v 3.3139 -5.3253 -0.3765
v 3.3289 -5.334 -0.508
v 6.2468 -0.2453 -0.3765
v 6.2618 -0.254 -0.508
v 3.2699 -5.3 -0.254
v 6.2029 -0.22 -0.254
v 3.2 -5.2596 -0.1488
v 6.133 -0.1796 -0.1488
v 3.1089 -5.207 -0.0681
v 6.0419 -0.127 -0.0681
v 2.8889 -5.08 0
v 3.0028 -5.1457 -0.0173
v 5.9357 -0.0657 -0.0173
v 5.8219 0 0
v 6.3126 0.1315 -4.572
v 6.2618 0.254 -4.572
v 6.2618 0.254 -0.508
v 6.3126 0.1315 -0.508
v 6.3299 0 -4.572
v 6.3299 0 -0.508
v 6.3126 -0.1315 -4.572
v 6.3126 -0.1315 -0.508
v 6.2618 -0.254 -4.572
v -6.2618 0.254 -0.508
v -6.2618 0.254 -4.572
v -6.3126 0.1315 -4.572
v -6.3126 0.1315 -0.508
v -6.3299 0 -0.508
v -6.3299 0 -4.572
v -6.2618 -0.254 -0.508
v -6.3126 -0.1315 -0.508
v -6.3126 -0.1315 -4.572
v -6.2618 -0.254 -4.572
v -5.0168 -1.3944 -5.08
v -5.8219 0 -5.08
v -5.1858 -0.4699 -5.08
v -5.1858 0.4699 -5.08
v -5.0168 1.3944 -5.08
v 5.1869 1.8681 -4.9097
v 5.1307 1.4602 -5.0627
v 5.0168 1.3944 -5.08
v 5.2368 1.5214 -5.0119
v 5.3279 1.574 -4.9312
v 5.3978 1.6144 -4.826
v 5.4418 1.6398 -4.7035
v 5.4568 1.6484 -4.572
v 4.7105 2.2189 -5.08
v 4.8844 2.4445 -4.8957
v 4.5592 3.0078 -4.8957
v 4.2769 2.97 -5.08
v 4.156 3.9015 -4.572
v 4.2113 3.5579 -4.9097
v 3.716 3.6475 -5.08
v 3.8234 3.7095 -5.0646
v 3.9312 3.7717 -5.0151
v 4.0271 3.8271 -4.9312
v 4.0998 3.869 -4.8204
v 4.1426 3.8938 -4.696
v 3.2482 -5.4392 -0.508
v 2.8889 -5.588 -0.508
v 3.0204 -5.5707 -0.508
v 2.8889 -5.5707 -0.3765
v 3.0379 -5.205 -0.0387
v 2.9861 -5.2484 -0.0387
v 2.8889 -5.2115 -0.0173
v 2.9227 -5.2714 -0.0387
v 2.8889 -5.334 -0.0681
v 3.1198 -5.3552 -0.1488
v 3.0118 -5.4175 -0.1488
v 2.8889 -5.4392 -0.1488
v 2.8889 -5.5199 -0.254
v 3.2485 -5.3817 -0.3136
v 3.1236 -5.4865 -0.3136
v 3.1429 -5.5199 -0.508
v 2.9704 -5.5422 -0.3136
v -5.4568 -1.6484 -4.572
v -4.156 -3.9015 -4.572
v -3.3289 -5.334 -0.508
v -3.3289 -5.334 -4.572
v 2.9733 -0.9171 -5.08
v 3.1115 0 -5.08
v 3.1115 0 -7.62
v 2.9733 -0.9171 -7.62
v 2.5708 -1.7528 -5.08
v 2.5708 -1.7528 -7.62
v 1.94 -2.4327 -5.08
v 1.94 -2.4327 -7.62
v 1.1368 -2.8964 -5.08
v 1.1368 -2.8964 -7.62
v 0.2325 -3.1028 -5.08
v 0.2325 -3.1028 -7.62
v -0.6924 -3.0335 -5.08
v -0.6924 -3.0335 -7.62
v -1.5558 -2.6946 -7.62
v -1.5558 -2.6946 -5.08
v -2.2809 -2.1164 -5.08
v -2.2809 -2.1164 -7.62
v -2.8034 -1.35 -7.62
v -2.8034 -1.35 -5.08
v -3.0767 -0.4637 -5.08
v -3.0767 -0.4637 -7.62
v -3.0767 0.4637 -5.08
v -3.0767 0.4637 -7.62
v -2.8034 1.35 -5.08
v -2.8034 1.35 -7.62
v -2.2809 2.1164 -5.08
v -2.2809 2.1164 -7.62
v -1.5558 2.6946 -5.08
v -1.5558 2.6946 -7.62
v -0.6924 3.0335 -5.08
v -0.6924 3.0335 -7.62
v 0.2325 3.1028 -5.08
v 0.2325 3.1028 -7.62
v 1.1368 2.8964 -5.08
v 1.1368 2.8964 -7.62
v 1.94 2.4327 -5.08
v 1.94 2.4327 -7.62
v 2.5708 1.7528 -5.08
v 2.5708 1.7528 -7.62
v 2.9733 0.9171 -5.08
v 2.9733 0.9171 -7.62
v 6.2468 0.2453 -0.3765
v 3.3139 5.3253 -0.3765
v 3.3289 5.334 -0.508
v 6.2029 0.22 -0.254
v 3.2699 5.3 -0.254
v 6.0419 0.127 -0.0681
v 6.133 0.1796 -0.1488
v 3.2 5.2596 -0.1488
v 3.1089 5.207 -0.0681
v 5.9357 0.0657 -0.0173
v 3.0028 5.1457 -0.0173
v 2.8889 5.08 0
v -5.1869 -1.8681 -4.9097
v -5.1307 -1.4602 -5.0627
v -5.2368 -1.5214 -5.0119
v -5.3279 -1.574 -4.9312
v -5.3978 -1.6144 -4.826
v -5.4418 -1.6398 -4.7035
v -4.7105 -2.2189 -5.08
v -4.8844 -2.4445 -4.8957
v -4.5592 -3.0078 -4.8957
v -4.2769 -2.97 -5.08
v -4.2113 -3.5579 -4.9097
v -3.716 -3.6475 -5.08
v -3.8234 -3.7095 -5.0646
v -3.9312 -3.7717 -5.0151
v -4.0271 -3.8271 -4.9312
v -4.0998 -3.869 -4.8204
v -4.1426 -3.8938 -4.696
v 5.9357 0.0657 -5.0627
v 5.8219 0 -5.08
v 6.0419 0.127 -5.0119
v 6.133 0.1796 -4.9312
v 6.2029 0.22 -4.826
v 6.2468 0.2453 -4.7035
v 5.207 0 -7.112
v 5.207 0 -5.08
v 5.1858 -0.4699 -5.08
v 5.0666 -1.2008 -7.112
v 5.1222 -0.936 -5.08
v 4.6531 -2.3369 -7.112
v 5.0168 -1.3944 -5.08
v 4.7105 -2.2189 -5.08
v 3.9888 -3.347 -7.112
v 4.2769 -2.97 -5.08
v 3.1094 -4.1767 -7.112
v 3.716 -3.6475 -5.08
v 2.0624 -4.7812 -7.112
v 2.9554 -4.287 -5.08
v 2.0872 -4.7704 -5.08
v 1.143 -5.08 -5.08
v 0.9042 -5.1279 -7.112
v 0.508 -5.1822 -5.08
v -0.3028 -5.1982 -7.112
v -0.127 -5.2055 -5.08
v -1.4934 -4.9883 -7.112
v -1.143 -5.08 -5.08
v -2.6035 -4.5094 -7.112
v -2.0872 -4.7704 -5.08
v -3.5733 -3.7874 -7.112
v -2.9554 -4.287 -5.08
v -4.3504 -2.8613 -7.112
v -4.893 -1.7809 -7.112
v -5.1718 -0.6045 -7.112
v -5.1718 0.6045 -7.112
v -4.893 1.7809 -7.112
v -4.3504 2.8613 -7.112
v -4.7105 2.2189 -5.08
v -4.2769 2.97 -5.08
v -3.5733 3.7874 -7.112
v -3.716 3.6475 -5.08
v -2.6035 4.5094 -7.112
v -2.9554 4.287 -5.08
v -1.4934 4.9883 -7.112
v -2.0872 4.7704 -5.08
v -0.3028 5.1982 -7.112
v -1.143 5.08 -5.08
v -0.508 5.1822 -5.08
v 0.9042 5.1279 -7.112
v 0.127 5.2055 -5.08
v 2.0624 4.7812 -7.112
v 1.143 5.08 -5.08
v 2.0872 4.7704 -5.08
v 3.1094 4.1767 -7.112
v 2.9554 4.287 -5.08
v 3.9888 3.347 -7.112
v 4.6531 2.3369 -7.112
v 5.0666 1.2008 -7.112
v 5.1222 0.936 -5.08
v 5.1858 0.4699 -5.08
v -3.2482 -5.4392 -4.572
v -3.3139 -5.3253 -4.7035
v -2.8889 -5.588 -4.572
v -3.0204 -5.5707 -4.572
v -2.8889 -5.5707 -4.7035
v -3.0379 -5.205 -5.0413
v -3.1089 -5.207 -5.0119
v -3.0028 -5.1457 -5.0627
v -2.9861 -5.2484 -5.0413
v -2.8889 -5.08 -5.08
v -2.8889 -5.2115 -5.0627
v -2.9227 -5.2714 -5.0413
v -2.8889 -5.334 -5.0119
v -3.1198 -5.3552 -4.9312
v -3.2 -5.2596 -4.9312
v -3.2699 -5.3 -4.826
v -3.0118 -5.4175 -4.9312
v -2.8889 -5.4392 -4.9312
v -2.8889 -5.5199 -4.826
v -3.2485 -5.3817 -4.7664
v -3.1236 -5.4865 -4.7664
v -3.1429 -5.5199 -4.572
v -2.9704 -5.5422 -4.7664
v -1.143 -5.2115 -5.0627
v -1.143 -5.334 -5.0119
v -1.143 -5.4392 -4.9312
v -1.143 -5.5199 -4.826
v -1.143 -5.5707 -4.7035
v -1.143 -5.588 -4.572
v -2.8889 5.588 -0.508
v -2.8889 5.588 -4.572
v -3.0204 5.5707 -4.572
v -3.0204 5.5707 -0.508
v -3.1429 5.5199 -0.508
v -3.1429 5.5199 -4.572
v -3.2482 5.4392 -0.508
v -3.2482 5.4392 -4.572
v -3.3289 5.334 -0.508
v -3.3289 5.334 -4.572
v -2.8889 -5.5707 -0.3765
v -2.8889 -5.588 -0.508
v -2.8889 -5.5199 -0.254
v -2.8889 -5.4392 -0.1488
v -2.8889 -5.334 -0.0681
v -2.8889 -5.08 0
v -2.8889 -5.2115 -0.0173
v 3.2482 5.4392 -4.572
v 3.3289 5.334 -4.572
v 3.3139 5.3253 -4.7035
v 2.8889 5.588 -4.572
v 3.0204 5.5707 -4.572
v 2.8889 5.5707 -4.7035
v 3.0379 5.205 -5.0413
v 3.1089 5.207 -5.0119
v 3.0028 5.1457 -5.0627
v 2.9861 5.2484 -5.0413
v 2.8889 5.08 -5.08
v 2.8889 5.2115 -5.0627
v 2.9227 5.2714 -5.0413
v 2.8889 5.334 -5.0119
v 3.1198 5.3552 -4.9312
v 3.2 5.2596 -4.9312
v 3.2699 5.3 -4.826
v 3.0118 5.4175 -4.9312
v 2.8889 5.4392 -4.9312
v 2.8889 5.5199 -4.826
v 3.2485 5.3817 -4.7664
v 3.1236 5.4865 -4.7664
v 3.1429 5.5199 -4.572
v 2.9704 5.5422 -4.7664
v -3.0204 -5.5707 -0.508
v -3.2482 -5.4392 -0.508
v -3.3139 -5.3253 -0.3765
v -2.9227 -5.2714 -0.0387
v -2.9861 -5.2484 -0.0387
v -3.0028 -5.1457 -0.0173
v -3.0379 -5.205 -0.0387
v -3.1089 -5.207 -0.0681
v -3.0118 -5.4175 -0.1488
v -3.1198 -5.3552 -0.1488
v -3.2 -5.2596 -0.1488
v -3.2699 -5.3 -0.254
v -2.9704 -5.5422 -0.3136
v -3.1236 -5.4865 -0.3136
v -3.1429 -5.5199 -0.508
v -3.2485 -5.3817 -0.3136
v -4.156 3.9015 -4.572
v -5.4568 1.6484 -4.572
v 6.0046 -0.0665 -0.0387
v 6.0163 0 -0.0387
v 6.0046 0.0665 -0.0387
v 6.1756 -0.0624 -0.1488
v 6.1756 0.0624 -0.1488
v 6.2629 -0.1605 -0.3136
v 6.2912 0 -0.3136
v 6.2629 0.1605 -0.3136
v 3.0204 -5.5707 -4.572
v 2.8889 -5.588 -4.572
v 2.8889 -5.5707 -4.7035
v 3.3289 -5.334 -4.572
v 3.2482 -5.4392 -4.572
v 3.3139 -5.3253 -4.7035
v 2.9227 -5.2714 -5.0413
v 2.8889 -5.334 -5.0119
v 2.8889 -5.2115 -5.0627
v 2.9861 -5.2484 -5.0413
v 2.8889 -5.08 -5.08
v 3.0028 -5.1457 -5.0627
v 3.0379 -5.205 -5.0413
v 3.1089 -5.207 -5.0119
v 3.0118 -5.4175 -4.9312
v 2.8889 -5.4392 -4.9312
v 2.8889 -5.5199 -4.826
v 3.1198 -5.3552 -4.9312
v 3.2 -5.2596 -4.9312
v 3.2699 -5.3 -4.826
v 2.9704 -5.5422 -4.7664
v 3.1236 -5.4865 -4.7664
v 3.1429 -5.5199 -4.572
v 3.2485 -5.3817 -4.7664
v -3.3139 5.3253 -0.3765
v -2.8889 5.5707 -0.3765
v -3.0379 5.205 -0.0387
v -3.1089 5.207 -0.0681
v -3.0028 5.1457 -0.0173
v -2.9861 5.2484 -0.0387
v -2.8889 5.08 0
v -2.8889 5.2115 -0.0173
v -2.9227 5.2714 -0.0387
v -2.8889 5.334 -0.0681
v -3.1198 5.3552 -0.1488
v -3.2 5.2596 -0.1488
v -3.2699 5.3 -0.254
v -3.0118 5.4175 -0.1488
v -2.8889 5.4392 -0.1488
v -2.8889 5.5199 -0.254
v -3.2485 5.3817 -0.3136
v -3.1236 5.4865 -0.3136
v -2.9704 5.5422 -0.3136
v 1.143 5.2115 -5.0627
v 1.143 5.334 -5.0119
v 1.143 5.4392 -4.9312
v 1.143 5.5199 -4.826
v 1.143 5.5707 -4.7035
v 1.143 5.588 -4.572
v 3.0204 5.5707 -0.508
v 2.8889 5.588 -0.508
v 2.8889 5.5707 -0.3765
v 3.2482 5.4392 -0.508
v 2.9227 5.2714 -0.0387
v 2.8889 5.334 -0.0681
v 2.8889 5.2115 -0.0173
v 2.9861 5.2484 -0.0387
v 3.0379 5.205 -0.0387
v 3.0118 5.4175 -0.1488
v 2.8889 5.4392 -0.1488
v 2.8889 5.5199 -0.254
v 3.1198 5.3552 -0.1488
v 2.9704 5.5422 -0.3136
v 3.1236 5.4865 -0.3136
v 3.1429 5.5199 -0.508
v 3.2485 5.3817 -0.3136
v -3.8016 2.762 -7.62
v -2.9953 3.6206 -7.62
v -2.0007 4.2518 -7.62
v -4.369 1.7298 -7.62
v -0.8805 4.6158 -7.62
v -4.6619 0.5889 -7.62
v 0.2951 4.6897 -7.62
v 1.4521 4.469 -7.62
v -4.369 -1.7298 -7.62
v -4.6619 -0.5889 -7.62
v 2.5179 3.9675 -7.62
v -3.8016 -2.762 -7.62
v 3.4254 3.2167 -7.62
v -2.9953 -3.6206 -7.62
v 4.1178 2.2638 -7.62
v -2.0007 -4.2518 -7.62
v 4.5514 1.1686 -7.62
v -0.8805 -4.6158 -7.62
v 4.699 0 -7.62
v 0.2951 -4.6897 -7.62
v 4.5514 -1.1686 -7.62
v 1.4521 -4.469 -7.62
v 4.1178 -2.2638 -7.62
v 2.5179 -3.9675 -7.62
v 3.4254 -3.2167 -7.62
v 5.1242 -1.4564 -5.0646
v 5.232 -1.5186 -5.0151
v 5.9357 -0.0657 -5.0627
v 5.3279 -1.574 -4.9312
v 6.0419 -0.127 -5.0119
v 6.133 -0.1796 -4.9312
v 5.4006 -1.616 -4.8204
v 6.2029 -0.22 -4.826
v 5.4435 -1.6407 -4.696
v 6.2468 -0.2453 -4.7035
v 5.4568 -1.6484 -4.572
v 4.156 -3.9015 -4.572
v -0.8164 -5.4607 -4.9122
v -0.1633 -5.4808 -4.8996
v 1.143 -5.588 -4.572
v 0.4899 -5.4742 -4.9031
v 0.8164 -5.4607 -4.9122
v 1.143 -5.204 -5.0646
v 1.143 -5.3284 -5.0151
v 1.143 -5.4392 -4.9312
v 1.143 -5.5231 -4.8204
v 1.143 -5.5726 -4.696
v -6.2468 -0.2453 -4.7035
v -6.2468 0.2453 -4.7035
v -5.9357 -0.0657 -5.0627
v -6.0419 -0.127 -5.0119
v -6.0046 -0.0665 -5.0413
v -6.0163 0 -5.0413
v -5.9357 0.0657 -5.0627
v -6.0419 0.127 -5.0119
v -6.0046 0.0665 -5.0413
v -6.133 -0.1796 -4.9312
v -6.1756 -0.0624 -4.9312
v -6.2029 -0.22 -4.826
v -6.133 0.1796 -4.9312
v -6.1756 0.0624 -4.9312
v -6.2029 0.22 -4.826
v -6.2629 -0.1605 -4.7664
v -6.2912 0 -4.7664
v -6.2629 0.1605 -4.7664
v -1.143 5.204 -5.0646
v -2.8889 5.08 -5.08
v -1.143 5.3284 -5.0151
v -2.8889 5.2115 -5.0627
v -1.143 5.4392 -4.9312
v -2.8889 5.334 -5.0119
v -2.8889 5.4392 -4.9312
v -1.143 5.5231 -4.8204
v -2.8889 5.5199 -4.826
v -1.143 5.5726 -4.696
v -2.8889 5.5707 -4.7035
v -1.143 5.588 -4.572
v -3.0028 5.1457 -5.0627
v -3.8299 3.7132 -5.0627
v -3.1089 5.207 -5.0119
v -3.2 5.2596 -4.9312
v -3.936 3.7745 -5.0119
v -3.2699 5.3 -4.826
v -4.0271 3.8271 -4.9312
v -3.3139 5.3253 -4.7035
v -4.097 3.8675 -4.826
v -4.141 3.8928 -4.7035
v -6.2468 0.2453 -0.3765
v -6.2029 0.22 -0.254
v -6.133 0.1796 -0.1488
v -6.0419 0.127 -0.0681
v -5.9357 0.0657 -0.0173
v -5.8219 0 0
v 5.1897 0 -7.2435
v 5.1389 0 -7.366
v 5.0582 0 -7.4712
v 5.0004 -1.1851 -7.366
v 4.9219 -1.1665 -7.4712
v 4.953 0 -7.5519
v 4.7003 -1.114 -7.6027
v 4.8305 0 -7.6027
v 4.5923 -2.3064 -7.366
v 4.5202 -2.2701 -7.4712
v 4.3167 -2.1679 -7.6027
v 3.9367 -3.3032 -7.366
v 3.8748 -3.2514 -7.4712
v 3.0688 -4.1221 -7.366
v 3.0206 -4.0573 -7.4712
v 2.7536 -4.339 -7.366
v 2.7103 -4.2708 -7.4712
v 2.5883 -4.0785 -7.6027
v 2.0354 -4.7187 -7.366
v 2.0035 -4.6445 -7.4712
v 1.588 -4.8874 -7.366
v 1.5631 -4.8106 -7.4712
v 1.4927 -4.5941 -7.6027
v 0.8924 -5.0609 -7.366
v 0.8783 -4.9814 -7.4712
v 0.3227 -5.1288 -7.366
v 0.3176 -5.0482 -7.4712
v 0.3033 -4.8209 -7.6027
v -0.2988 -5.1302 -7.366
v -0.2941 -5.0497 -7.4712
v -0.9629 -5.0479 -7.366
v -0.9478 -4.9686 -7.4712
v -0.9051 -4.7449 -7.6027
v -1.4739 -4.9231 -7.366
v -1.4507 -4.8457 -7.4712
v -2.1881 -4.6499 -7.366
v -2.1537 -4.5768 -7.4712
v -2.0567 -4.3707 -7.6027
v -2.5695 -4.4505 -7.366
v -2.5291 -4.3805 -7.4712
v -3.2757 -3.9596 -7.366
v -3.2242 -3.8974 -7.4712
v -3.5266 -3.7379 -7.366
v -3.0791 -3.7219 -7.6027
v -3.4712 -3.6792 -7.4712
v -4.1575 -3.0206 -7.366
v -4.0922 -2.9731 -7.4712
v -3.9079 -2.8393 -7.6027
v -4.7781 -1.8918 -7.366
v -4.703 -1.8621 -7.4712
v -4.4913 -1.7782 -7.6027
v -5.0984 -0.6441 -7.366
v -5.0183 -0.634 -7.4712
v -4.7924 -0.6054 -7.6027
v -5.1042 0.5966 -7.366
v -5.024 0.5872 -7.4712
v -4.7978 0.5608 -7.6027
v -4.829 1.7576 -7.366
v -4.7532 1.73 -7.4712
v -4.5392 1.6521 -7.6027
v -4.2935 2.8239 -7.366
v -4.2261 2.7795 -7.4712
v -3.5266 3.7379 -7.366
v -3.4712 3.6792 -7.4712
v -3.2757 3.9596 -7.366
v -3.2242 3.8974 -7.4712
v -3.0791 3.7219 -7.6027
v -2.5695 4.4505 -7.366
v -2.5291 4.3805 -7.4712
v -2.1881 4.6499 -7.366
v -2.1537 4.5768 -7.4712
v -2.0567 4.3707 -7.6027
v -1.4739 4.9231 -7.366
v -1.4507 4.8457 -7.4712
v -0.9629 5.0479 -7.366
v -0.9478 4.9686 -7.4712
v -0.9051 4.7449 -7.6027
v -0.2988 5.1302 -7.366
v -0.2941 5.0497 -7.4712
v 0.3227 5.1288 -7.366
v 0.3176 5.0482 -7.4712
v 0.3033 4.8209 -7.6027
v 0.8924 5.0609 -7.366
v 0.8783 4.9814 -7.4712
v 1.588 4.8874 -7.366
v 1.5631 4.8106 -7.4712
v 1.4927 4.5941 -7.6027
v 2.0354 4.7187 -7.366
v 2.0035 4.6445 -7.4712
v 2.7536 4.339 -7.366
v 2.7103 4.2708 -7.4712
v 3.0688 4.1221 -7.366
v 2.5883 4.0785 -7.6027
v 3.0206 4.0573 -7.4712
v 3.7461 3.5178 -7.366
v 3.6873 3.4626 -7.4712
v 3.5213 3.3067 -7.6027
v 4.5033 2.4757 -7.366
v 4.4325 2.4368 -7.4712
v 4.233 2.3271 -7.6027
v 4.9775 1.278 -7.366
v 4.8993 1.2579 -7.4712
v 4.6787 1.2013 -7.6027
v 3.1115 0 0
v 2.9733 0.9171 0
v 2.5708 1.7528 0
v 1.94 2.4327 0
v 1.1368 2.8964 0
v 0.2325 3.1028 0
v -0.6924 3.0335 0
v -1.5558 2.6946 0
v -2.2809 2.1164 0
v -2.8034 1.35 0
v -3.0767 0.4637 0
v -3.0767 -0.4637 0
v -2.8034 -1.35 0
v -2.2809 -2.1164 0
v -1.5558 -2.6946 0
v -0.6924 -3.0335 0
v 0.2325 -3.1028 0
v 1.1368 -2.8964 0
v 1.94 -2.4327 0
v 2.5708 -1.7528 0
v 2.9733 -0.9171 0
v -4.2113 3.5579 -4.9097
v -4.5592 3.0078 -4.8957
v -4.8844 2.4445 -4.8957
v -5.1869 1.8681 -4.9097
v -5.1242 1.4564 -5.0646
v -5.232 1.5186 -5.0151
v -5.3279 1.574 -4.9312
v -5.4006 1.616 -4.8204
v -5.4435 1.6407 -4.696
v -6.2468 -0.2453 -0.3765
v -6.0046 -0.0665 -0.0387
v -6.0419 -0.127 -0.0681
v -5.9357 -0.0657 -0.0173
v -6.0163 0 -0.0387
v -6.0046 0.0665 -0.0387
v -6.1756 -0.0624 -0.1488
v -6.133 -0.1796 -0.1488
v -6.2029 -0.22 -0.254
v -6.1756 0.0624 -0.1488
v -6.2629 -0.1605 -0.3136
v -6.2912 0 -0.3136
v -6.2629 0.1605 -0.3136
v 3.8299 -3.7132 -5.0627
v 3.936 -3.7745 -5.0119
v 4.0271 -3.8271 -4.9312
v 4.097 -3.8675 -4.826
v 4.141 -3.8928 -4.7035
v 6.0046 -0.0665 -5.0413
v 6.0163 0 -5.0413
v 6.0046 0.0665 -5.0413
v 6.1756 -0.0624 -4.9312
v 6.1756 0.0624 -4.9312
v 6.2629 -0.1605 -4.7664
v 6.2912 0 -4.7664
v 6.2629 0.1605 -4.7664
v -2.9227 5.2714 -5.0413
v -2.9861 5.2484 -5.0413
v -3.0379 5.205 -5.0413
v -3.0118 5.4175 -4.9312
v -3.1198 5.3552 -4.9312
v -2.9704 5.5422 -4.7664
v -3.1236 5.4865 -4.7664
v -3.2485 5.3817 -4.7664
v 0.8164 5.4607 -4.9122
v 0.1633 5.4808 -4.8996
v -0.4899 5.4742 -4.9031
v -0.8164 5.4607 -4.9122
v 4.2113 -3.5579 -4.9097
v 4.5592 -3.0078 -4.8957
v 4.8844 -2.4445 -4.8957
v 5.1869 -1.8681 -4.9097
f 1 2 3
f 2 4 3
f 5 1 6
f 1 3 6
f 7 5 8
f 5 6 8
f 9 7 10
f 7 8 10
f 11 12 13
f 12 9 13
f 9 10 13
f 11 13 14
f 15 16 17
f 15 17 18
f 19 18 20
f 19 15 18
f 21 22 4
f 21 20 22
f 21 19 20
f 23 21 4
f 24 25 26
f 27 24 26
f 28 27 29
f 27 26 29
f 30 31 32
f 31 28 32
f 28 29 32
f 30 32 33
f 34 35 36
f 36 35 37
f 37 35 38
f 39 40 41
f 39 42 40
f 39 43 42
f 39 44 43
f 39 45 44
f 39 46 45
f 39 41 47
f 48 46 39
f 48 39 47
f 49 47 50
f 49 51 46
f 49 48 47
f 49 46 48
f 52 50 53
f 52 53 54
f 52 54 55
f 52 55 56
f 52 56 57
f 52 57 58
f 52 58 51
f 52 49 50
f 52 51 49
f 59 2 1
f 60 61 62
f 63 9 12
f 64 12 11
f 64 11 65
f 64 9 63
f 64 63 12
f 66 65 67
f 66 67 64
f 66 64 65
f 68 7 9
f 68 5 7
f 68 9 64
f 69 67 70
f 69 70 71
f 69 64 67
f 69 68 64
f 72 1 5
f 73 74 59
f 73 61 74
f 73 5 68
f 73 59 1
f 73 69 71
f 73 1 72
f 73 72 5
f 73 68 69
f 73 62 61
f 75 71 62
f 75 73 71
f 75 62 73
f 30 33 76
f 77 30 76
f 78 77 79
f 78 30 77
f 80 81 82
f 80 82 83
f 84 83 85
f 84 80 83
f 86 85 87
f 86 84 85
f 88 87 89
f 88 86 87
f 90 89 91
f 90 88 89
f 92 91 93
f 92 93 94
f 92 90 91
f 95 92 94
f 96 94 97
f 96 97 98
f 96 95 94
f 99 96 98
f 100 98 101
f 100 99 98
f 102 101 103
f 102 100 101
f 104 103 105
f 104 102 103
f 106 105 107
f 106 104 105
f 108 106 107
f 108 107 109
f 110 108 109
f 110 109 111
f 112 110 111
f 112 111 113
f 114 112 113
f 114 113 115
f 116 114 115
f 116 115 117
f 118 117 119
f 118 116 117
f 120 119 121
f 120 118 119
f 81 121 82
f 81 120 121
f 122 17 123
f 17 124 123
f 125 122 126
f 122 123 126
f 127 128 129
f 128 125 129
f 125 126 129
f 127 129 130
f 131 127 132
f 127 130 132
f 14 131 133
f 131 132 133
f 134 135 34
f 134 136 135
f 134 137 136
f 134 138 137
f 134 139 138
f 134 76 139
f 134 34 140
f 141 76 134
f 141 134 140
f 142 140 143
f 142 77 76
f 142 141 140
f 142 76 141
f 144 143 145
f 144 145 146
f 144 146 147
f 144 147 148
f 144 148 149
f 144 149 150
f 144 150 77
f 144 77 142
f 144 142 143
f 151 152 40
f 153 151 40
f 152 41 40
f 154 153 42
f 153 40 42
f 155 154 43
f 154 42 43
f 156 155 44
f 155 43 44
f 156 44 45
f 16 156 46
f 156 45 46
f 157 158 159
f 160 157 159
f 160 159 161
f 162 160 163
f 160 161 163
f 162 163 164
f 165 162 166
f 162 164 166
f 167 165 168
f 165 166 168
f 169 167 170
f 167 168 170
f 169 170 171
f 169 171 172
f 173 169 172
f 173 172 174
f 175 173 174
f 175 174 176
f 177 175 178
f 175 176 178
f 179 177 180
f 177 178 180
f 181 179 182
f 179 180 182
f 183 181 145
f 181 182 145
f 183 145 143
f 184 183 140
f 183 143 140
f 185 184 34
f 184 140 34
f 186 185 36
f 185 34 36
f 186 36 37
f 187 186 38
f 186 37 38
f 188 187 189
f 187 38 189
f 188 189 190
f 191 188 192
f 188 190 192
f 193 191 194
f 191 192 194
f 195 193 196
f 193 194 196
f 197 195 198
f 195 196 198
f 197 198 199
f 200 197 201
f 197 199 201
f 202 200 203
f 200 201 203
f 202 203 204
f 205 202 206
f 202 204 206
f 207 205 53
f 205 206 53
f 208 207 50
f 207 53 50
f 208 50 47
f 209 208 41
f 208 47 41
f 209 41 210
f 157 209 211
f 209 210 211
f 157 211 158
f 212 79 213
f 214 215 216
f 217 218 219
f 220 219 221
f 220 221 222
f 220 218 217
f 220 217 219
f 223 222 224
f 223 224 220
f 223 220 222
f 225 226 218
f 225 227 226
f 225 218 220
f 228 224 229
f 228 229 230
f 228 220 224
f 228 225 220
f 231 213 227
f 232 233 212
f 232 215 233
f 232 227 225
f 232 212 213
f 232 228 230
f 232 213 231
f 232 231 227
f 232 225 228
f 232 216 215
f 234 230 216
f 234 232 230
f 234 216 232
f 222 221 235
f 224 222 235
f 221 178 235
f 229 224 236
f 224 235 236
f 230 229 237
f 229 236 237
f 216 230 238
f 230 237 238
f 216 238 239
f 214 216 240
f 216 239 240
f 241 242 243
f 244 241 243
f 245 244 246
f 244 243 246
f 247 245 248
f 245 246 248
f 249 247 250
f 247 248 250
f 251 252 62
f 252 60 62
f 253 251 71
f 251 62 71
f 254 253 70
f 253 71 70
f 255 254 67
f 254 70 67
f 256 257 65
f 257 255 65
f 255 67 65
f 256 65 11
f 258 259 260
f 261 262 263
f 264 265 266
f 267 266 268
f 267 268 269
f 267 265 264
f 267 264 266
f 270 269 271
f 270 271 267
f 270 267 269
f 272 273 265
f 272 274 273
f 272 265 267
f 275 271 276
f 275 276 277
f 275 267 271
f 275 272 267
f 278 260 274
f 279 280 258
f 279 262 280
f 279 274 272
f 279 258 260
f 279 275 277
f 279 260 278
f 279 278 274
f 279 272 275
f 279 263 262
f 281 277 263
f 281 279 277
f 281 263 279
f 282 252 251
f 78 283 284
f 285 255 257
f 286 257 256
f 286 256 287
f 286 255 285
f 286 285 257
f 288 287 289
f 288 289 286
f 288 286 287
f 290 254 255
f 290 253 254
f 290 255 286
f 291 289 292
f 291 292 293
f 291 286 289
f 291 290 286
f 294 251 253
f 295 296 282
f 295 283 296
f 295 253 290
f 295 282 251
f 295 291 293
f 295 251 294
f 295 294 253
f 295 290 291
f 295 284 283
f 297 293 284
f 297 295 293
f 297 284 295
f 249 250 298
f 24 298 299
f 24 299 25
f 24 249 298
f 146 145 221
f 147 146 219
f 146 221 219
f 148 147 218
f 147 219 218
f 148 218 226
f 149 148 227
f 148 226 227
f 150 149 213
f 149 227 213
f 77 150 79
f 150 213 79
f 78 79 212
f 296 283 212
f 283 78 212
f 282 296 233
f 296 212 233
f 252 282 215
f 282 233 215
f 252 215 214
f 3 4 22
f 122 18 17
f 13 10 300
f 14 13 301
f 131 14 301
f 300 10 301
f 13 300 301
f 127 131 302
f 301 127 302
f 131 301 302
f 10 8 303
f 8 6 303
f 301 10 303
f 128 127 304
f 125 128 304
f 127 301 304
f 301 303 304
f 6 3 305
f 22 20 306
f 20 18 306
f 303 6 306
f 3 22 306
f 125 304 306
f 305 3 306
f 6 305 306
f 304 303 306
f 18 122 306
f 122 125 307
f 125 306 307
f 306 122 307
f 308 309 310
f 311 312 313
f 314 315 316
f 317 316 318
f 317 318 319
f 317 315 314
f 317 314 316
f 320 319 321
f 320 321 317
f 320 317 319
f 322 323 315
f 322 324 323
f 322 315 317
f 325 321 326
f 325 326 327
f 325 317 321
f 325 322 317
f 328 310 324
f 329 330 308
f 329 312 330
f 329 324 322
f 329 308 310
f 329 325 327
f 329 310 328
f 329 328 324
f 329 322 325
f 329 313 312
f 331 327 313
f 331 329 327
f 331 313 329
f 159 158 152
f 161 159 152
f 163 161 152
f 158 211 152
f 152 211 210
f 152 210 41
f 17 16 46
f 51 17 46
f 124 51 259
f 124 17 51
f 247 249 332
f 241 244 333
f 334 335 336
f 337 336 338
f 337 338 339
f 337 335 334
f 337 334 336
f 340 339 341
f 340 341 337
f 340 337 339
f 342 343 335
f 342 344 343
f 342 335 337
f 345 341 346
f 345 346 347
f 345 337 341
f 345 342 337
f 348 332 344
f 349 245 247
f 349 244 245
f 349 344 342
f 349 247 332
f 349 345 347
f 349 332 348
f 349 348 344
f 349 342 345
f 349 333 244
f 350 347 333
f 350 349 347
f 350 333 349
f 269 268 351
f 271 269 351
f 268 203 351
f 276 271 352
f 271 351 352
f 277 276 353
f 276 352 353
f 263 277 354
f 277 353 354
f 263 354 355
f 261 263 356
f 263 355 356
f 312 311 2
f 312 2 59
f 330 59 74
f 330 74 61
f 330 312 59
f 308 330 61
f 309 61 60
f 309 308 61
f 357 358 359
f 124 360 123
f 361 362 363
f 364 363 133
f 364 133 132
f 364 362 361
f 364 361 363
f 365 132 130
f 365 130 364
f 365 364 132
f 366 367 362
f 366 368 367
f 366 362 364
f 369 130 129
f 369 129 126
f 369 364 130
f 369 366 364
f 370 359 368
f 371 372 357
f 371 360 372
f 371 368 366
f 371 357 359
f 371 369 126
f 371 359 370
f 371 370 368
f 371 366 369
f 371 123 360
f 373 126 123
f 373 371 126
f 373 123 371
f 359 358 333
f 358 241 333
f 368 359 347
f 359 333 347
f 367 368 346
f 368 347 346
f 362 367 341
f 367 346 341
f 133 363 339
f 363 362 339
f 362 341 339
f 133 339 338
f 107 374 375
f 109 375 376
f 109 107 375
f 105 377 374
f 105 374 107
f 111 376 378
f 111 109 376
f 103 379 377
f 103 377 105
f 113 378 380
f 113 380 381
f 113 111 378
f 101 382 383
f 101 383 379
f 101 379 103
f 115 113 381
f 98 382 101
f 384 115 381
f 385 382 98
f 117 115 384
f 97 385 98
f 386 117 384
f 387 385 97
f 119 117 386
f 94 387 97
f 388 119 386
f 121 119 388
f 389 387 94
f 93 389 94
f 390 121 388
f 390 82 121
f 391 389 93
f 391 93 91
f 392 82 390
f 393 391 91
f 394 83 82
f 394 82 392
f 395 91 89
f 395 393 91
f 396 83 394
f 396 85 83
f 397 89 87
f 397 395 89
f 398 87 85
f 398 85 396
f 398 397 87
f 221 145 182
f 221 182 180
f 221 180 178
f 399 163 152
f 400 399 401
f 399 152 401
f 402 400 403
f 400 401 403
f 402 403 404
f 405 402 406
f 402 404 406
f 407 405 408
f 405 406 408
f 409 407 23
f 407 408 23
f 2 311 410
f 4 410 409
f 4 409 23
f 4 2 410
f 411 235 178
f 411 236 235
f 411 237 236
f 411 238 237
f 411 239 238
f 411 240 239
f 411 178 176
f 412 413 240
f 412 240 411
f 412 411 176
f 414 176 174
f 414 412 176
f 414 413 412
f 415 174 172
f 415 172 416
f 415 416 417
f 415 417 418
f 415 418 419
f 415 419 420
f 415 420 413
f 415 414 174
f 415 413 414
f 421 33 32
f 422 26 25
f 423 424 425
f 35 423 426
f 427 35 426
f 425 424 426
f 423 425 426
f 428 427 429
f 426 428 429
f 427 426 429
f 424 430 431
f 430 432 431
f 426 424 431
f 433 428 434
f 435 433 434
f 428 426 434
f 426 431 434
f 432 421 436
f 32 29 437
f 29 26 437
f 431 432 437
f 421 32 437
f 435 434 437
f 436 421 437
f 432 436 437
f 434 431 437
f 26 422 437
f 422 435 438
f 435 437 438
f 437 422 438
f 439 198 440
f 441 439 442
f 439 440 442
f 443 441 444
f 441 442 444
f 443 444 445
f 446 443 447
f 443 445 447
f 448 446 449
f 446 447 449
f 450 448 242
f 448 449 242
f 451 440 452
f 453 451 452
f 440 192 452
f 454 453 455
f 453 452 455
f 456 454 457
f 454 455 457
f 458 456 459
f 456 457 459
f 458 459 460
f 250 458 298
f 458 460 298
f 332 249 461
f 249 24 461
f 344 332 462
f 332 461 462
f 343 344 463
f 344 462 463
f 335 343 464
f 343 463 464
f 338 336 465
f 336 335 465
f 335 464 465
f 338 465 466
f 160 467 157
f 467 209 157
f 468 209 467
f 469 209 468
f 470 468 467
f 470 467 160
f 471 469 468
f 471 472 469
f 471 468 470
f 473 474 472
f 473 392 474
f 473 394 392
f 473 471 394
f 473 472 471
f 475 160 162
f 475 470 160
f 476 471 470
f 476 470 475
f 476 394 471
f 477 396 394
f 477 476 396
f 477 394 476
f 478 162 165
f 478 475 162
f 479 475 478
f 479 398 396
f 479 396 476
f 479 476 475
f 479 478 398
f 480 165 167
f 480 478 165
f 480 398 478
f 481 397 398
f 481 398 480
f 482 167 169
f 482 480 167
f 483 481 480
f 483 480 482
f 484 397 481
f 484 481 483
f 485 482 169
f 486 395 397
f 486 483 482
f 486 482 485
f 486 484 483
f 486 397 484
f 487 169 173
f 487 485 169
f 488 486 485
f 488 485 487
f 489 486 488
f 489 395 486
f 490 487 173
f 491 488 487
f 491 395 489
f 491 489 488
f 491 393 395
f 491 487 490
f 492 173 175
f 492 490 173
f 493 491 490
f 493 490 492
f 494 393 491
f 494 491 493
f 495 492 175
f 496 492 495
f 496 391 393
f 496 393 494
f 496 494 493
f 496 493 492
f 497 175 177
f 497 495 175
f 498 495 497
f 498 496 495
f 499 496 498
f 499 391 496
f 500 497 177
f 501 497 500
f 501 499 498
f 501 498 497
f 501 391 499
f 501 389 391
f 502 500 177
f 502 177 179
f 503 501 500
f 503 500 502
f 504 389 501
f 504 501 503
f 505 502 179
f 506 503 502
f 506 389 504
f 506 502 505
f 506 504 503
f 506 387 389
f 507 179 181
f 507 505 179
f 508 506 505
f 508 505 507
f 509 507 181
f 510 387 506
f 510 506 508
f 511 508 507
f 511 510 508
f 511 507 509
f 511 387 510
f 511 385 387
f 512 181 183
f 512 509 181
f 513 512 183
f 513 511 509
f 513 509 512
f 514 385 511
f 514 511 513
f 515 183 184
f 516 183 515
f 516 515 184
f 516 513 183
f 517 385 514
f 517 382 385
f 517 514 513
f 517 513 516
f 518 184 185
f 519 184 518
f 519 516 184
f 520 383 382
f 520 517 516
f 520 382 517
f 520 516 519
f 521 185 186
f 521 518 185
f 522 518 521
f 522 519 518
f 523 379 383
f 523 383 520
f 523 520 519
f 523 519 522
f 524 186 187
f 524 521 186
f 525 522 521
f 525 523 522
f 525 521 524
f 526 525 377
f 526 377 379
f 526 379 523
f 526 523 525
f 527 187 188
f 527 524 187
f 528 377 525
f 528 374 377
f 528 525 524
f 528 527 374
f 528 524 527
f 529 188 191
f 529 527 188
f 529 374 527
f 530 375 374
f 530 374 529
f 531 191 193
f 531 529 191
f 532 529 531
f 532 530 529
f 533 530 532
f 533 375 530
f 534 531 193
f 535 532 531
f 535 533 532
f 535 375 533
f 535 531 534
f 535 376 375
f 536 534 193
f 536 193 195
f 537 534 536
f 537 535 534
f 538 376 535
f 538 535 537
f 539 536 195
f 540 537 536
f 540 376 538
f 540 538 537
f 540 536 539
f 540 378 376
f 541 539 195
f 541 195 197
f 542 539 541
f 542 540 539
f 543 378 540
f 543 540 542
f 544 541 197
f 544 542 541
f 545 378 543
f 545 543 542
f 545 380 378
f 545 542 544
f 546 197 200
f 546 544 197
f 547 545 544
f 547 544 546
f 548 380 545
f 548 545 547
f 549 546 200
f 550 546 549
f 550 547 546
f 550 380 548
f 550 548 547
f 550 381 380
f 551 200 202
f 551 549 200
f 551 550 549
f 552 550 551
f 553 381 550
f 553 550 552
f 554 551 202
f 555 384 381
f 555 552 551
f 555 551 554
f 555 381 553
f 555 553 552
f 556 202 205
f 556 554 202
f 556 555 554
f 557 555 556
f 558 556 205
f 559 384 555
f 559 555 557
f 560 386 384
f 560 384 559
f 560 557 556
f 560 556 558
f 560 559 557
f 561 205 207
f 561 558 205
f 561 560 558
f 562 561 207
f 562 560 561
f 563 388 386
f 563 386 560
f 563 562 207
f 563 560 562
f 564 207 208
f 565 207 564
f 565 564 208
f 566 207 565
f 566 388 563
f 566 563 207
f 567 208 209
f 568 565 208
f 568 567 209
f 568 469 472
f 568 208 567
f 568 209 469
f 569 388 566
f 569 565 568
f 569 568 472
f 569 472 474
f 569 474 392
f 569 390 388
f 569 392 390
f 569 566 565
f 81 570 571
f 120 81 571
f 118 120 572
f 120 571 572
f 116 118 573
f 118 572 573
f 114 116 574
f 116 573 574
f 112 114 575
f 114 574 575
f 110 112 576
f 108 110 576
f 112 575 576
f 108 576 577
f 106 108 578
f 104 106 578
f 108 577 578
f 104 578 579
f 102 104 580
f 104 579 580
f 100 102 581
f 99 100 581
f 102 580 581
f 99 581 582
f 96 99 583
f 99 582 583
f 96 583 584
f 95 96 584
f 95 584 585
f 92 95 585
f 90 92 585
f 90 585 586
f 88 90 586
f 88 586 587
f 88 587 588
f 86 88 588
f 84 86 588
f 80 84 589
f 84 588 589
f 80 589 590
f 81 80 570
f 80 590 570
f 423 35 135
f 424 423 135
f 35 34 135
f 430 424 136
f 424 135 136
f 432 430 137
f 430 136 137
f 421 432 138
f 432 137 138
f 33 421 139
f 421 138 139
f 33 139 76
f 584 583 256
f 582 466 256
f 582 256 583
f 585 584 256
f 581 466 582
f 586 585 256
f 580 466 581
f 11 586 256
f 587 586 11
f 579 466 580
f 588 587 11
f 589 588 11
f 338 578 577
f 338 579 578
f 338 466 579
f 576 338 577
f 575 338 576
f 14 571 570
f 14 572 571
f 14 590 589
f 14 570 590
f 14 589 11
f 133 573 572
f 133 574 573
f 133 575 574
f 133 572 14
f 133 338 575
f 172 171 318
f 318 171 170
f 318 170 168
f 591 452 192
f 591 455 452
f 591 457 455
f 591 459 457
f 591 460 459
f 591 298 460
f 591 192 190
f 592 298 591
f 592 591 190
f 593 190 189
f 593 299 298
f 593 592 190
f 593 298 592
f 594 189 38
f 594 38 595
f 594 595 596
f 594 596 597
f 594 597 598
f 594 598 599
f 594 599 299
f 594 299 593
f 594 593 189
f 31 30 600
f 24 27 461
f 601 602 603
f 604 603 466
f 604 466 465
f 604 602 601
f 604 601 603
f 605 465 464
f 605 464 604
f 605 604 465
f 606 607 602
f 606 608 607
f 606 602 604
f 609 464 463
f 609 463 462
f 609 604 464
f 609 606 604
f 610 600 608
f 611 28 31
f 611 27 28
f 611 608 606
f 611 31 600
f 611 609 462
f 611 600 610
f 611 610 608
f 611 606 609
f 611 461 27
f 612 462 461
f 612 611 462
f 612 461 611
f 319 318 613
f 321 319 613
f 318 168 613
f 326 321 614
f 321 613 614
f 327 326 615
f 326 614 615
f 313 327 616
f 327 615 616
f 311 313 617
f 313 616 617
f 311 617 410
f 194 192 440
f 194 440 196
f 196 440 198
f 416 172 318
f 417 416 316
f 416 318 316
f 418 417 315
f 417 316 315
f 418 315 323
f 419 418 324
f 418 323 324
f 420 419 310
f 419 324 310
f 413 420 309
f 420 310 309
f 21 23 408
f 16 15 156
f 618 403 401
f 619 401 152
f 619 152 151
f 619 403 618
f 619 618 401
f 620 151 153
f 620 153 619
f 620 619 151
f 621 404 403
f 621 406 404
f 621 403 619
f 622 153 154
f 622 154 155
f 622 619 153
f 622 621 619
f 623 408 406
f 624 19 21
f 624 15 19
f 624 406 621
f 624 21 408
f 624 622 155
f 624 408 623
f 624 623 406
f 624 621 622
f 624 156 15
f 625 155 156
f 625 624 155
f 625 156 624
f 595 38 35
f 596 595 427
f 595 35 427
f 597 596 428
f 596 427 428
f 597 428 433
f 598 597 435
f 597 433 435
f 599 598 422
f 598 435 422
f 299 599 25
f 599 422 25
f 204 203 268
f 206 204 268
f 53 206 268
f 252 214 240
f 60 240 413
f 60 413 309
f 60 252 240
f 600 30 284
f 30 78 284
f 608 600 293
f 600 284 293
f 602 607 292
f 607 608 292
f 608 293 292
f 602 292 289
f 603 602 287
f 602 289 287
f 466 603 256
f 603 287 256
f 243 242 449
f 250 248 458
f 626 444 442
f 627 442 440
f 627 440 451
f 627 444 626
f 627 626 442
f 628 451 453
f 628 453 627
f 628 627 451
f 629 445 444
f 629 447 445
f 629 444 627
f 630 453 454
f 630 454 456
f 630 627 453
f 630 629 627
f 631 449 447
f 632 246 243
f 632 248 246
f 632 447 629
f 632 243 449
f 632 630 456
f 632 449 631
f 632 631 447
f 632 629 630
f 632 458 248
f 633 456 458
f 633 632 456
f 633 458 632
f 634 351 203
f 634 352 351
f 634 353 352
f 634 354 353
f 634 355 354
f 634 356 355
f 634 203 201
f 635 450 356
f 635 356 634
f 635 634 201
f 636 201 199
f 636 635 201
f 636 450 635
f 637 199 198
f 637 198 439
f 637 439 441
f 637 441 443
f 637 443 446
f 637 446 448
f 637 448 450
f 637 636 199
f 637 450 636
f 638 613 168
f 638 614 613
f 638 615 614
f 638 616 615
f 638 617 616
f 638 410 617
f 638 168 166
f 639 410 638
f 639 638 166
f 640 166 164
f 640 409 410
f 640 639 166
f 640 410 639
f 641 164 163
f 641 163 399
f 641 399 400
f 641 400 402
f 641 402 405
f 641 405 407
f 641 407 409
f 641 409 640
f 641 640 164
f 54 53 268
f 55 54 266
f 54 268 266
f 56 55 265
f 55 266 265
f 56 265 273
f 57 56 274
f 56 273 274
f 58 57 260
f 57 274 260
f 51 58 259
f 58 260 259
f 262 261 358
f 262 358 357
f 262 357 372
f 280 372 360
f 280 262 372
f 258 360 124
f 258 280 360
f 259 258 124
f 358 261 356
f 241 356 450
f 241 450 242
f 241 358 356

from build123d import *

# Parameters (mm, degrees)
SKETCH1_R      = 3.1115
EXTRUDE1_DEPTH = 5.08
SKETCH2_R      = 5.207
SKETCH2_R_2    = 3.1115
EXTRUDE2_DEPTH = 2.54
FILLET1_R      = 0.508


with BuildPart() as part:
    # Sketch1 → Extrude1 (new body)
    with BuildSketch(Plane.XY):
        Polygon((3.182239214, 5.588), (-3.182239214, 5.588), (-6.408472518, 0), (-3.182239214, -5.588), (3.182239214, -5.588), (6.408472518, 0), align=None)
        Circle(SKETCH1_R, mode=Mode.SUBTRACT)
    extrude(amount=-EXTRUDE1_DEPTH)

    # Sketch2 → Extrude2 (add)
    with BuildSketch(Plane(origin=(0, 0, -5.08), x_dir=(-1, 0, 0), z_dir=(0, 0, -1))):
        with Locations(Location((0, 0, 0), (0, 0, 180))):
            Circle(SKETCH2_R)
        with Locations(Location((0, 0, 0), (0, 0, 180))):
            Circle(SKETCH2_R_2, mode=Mode.SUBTRACT)
    extrude(amount=EXTRUDE2_DEPTH)

    # Fillet1
    fillet1_edges = [part.edges().sort_by_distance(p)[0] for p in [
        (-4.795355866, 2.794, -5.08),
        (6.408472518, 0, -2.54),
        (3.182239214, -5.588, -2.54),
        (-3.182239214, -5.588, -2.54),
        (-6.408472518, 0, -2.54),
        (-3.182239214, 5.588, -2.54),
        (3.182239214, 5.588, -2.54),
        (-4.795355866, -2.794, -5.08),
        (0, -5.588, -5.08),
        (4.795355866, -2.794, -5.08),
        (-5.207, 0, -7.62),
        (4.795355866, 2.794, -5.08),
        (4.795355866, -2.794, 0),
        (0, -5.588, 0),
        (-4.795355866, -2.794, 0),
        (0, 5.588, -5.08),
        (-4.795355866, 2.794, 0),
        (0, 5.588, 0),
        (4.795355866, 2.794, 0),
    ]]
    fillet(fillet1_edges, radius=FILLET1_R)


solid = part.part
